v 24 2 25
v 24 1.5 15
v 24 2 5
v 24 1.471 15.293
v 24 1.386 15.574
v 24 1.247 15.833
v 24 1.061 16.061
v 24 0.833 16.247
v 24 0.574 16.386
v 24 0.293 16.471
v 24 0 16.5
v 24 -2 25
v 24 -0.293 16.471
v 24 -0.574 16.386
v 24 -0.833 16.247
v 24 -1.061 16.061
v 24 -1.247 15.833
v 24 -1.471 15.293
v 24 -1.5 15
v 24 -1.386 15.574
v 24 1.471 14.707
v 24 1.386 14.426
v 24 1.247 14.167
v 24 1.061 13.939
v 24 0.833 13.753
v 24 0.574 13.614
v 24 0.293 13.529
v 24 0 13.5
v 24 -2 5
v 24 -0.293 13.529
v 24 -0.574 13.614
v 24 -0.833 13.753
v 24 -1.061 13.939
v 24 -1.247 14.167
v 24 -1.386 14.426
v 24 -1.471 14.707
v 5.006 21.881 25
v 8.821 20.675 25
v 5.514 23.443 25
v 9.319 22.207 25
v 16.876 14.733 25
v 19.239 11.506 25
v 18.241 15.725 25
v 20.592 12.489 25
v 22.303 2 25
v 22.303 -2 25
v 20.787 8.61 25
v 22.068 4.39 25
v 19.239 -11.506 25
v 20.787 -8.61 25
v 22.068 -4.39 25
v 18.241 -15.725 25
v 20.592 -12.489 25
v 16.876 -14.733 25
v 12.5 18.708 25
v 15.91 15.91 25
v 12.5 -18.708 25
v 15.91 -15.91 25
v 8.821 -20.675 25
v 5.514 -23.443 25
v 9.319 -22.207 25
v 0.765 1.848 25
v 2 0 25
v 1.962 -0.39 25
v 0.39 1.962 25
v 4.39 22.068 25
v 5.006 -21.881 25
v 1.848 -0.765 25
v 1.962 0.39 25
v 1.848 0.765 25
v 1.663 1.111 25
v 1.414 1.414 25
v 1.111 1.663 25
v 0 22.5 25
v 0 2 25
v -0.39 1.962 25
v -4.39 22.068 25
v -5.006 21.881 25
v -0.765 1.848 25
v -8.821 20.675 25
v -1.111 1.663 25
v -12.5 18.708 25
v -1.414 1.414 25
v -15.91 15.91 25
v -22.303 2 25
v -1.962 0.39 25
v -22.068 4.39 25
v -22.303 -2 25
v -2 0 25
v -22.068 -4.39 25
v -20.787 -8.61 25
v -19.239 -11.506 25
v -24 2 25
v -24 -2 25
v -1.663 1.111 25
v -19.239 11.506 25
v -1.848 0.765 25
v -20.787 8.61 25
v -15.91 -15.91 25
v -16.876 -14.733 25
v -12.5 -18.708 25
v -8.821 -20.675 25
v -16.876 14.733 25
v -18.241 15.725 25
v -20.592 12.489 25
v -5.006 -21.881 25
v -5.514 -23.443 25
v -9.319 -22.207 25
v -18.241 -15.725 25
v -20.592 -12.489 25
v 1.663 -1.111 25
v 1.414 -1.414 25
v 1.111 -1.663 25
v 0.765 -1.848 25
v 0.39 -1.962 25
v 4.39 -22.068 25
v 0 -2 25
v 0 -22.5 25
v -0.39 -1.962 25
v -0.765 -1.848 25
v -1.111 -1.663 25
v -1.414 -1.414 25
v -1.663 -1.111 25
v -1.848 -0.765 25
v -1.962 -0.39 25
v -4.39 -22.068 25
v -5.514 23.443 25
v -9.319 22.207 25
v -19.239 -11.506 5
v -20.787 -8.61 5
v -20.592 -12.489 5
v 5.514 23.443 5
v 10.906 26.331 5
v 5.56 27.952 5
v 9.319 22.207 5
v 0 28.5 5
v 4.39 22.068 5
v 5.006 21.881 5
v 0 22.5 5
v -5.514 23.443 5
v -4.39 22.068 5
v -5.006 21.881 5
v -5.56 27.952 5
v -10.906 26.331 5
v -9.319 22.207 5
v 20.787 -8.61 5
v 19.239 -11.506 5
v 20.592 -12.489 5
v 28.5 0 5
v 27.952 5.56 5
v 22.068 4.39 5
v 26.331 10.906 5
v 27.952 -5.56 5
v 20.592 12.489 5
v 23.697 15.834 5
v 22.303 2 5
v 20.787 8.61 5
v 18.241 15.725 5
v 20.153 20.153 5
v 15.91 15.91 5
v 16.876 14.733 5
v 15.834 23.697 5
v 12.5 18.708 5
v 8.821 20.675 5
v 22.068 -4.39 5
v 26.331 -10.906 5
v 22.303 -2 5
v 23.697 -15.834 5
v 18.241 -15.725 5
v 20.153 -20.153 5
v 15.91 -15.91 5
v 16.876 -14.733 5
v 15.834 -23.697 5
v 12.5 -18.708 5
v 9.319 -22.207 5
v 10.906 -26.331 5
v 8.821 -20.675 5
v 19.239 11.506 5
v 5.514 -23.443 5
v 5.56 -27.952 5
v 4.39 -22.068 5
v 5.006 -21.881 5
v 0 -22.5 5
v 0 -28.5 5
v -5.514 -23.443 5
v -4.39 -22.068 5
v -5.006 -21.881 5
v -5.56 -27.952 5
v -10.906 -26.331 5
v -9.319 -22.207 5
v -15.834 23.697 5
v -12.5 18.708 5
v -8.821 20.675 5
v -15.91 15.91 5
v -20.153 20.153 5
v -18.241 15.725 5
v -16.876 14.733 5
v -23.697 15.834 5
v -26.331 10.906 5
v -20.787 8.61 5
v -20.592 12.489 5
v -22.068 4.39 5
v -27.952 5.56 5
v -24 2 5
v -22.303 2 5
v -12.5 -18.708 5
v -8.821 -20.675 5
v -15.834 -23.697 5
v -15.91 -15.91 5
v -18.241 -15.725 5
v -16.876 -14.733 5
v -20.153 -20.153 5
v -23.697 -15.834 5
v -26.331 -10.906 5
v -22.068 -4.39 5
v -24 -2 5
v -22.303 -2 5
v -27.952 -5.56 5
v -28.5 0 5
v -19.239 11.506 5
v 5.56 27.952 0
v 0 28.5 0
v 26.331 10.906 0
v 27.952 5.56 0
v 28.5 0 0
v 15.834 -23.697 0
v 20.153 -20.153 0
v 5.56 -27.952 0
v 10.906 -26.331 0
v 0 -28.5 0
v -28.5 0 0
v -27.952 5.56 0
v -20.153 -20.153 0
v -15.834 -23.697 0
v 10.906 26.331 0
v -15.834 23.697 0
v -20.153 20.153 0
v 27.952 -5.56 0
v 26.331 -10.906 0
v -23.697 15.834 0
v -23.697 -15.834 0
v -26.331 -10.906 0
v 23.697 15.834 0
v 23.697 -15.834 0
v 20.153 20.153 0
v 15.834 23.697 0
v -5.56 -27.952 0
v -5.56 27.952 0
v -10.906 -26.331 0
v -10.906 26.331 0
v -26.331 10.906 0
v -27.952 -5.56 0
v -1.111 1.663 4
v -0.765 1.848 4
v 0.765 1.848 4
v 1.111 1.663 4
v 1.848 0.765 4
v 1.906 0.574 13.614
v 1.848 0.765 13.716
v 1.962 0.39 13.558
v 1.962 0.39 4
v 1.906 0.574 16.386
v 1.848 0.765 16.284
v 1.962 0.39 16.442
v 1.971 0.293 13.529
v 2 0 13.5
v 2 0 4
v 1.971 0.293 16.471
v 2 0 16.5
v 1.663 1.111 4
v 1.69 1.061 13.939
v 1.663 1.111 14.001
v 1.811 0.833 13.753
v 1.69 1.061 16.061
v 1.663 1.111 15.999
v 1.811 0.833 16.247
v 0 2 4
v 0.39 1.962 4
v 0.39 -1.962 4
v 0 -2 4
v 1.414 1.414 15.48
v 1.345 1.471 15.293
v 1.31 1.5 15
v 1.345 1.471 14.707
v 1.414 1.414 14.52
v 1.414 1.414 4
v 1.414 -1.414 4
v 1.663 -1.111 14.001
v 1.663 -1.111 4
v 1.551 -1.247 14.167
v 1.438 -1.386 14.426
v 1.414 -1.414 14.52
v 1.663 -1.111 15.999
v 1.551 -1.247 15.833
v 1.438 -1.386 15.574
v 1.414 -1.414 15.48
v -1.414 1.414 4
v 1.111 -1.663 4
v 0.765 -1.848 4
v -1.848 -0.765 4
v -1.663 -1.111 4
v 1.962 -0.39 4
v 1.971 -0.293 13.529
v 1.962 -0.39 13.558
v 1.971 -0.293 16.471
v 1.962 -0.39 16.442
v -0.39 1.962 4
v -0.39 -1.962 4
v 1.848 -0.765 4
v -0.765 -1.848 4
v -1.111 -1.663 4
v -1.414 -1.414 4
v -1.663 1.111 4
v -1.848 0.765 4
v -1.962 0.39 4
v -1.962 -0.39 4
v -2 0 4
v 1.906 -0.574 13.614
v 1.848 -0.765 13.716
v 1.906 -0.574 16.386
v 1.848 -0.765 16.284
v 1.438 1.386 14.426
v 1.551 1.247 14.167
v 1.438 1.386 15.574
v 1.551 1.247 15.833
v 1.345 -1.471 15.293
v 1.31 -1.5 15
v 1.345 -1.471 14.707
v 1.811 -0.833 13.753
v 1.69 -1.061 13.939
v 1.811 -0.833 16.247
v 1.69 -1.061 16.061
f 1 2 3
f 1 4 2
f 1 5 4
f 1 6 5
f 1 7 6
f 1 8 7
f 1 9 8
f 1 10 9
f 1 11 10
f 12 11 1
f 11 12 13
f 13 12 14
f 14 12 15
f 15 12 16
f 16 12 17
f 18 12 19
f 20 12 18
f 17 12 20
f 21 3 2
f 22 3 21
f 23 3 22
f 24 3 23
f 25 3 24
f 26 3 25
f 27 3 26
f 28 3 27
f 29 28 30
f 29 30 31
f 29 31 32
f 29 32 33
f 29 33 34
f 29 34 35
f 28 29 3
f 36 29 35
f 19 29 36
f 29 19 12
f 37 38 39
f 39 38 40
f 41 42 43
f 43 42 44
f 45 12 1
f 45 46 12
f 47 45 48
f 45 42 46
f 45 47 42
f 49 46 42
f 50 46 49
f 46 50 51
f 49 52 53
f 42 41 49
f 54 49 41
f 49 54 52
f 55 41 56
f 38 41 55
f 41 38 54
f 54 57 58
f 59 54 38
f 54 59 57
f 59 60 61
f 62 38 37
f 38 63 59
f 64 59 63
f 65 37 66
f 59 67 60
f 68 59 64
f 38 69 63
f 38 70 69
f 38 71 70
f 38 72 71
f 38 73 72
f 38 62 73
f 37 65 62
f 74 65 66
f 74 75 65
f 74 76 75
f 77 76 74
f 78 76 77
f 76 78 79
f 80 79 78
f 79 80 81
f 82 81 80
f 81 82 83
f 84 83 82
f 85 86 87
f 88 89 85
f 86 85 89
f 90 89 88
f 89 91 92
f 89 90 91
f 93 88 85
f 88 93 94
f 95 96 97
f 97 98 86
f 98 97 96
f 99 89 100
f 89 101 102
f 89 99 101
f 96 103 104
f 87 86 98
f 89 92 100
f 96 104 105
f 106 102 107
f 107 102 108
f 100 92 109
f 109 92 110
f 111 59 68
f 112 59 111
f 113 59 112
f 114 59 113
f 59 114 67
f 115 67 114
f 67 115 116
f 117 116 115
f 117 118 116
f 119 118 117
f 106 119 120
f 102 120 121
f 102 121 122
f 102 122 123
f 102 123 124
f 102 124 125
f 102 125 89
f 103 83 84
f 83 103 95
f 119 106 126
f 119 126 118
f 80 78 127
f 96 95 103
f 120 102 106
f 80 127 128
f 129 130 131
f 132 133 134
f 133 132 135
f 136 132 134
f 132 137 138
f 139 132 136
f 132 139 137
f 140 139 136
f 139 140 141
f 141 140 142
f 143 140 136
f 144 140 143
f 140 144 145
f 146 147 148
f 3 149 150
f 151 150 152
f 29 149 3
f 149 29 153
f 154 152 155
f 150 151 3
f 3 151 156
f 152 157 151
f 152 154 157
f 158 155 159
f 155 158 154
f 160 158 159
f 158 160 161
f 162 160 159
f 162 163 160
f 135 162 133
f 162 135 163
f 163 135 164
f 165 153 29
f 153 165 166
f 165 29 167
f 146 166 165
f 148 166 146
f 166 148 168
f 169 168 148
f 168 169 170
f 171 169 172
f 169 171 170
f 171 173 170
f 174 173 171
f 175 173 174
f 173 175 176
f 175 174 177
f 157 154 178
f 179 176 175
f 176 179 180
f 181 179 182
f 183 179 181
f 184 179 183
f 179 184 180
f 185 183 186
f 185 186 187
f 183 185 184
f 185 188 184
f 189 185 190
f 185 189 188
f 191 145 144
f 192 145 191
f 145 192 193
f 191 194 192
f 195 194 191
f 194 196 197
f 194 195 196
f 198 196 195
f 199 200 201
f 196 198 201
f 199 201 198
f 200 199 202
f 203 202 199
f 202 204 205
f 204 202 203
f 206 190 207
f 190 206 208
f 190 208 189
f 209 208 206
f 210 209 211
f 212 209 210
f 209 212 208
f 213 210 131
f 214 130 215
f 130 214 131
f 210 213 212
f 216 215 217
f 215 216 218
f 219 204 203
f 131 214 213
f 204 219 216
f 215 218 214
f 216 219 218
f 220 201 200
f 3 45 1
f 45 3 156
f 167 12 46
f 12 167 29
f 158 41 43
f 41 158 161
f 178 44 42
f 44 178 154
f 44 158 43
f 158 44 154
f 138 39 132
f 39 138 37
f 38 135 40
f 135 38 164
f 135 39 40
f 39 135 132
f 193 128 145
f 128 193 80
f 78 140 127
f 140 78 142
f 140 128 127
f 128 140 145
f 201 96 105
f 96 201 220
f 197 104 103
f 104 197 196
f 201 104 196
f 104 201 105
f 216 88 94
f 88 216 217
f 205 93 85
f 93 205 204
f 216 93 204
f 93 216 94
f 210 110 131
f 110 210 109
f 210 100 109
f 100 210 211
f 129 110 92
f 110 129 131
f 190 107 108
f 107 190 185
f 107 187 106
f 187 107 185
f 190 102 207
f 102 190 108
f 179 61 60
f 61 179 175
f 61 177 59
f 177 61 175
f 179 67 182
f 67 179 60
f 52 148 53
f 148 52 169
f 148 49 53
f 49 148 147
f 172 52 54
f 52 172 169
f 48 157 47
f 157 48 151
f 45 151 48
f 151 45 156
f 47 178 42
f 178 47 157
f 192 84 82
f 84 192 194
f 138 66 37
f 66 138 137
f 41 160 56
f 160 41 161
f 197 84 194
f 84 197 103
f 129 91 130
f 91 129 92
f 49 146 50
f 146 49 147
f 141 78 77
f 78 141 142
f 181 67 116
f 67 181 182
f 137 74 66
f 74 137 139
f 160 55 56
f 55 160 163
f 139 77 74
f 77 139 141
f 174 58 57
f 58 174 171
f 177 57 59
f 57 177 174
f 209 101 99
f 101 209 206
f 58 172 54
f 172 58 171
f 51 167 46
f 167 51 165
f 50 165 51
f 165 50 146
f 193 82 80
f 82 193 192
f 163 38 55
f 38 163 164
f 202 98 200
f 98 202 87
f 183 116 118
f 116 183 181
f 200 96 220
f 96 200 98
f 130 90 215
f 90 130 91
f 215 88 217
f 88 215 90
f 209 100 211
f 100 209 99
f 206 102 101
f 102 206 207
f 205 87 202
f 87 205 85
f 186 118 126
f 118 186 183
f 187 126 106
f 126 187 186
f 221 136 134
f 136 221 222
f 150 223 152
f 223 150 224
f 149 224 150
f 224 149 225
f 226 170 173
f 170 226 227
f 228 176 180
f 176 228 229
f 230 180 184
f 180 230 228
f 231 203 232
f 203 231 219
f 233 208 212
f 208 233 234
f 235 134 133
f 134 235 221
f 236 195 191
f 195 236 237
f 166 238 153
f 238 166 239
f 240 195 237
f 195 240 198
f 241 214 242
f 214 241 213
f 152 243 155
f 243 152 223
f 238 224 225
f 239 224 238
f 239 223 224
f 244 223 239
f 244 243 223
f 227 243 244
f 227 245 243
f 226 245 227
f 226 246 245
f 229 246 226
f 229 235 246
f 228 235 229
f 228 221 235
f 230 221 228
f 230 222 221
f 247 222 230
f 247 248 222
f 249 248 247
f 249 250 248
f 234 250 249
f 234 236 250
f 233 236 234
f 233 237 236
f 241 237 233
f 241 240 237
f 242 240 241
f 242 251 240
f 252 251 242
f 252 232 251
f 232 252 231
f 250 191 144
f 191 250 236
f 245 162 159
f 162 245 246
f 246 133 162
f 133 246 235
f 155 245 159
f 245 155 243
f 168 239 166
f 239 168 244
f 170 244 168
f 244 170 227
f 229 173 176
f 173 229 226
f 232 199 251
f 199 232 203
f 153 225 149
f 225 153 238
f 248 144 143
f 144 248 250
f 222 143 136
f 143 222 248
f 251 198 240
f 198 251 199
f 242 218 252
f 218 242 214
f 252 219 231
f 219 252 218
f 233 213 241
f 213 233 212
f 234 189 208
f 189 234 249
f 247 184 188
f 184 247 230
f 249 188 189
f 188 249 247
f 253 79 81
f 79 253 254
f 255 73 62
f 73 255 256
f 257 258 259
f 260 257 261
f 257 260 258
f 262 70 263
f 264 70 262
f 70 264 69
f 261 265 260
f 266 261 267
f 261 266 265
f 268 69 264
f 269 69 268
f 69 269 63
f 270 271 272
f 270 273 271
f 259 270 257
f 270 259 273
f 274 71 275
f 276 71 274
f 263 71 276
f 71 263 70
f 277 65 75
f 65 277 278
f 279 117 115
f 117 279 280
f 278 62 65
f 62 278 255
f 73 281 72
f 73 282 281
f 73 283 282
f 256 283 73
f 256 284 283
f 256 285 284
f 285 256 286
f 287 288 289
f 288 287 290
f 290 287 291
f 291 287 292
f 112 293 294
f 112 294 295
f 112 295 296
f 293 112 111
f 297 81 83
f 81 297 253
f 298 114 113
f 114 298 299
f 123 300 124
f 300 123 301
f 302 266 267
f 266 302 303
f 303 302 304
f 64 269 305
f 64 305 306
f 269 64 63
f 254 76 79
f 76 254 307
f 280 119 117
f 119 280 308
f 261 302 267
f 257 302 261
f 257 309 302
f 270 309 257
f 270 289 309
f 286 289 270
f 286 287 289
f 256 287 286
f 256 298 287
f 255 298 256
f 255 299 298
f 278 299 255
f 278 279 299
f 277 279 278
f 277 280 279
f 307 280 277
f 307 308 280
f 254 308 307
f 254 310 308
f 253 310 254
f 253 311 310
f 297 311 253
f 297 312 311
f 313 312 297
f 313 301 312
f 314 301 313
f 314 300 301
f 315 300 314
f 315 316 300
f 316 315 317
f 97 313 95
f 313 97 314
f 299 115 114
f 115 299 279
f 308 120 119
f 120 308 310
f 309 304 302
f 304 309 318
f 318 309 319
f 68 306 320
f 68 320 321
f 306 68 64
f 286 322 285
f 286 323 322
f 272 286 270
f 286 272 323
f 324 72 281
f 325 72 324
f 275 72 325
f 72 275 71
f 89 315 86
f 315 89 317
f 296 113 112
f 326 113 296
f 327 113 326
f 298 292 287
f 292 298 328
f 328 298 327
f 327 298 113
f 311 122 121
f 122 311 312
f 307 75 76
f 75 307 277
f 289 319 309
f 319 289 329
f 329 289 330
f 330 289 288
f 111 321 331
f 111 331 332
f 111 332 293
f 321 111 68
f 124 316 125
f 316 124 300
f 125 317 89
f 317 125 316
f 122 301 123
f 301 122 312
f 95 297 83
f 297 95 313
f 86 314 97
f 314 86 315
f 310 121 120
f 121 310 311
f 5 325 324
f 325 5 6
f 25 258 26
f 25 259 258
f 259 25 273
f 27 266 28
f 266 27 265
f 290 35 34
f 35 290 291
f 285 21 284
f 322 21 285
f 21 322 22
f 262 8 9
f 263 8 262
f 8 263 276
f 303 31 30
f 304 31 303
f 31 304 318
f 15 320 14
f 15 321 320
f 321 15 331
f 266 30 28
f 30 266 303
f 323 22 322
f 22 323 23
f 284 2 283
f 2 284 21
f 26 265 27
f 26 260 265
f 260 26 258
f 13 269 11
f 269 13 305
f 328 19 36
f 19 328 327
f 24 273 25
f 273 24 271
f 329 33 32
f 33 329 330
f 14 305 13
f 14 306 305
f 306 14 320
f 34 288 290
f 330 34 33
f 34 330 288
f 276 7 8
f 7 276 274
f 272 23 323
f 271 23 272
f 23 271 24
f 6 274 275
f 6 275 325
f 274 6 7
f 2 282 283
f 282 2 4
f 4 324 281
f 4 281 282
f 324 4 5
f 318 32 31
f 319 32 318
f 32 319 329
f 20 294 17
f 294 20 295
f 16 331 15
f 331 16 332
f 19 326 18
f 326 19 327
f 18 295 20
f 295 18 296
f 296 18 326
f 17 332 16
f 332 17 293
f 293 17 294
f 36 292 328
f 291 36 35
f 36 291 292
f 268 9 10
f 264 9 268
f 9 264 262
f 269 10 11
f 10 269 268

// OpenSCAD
$fn = 32;

// ----------------------------------------------------------------------
// Control knob: skirt knob with grip ribs
// ----------------------------------------------------------------------

// --- parameters (mm) ---
skirt_d = 57;             // skirt diameter
skirt_t = 5;              // skirt thickness
rib_w = 4;                // grip rib width
rib_out = 2.5;            // grip rib radial protrusion
n_ribs = 10;              // number of grip ribs
knob_d = 45;              // knob body diameter
knob_h = 20;              // knob body height
bore_d = 4;               // shaft bore diameter
set_d = 3;                // set screw bore diameter

rib_step = 360 / n_ribs;  // rib angular step
total_h = skirt_t + knob_h;  // overall height

difference() {
  union() {
    translate([0, 0, skirt_t]) cylinder(h = knob_h, d = knob_d);
    cylinder(h = skirt_t, d = skirt_d);
    for (i = [0 : n_ribs - 1])
      rotate([0, 0, i * rib_step])
        translate([knob_d / 2 - 1, -rib_w / 2, skirt_t])
          cube([rib_out, rib_w, knob_h]);
  }
  translate([0, 0, skirt_t - 1]) cylinder(h = knob_h + 2, d = bore_d);
  translate([-1, 0, skirt_t + knob_h / 2]) rotate([0, 90, 0])
    cylinder(h = knob_d / 2 + bore_d / 2 + 2, d = set_d);
}
